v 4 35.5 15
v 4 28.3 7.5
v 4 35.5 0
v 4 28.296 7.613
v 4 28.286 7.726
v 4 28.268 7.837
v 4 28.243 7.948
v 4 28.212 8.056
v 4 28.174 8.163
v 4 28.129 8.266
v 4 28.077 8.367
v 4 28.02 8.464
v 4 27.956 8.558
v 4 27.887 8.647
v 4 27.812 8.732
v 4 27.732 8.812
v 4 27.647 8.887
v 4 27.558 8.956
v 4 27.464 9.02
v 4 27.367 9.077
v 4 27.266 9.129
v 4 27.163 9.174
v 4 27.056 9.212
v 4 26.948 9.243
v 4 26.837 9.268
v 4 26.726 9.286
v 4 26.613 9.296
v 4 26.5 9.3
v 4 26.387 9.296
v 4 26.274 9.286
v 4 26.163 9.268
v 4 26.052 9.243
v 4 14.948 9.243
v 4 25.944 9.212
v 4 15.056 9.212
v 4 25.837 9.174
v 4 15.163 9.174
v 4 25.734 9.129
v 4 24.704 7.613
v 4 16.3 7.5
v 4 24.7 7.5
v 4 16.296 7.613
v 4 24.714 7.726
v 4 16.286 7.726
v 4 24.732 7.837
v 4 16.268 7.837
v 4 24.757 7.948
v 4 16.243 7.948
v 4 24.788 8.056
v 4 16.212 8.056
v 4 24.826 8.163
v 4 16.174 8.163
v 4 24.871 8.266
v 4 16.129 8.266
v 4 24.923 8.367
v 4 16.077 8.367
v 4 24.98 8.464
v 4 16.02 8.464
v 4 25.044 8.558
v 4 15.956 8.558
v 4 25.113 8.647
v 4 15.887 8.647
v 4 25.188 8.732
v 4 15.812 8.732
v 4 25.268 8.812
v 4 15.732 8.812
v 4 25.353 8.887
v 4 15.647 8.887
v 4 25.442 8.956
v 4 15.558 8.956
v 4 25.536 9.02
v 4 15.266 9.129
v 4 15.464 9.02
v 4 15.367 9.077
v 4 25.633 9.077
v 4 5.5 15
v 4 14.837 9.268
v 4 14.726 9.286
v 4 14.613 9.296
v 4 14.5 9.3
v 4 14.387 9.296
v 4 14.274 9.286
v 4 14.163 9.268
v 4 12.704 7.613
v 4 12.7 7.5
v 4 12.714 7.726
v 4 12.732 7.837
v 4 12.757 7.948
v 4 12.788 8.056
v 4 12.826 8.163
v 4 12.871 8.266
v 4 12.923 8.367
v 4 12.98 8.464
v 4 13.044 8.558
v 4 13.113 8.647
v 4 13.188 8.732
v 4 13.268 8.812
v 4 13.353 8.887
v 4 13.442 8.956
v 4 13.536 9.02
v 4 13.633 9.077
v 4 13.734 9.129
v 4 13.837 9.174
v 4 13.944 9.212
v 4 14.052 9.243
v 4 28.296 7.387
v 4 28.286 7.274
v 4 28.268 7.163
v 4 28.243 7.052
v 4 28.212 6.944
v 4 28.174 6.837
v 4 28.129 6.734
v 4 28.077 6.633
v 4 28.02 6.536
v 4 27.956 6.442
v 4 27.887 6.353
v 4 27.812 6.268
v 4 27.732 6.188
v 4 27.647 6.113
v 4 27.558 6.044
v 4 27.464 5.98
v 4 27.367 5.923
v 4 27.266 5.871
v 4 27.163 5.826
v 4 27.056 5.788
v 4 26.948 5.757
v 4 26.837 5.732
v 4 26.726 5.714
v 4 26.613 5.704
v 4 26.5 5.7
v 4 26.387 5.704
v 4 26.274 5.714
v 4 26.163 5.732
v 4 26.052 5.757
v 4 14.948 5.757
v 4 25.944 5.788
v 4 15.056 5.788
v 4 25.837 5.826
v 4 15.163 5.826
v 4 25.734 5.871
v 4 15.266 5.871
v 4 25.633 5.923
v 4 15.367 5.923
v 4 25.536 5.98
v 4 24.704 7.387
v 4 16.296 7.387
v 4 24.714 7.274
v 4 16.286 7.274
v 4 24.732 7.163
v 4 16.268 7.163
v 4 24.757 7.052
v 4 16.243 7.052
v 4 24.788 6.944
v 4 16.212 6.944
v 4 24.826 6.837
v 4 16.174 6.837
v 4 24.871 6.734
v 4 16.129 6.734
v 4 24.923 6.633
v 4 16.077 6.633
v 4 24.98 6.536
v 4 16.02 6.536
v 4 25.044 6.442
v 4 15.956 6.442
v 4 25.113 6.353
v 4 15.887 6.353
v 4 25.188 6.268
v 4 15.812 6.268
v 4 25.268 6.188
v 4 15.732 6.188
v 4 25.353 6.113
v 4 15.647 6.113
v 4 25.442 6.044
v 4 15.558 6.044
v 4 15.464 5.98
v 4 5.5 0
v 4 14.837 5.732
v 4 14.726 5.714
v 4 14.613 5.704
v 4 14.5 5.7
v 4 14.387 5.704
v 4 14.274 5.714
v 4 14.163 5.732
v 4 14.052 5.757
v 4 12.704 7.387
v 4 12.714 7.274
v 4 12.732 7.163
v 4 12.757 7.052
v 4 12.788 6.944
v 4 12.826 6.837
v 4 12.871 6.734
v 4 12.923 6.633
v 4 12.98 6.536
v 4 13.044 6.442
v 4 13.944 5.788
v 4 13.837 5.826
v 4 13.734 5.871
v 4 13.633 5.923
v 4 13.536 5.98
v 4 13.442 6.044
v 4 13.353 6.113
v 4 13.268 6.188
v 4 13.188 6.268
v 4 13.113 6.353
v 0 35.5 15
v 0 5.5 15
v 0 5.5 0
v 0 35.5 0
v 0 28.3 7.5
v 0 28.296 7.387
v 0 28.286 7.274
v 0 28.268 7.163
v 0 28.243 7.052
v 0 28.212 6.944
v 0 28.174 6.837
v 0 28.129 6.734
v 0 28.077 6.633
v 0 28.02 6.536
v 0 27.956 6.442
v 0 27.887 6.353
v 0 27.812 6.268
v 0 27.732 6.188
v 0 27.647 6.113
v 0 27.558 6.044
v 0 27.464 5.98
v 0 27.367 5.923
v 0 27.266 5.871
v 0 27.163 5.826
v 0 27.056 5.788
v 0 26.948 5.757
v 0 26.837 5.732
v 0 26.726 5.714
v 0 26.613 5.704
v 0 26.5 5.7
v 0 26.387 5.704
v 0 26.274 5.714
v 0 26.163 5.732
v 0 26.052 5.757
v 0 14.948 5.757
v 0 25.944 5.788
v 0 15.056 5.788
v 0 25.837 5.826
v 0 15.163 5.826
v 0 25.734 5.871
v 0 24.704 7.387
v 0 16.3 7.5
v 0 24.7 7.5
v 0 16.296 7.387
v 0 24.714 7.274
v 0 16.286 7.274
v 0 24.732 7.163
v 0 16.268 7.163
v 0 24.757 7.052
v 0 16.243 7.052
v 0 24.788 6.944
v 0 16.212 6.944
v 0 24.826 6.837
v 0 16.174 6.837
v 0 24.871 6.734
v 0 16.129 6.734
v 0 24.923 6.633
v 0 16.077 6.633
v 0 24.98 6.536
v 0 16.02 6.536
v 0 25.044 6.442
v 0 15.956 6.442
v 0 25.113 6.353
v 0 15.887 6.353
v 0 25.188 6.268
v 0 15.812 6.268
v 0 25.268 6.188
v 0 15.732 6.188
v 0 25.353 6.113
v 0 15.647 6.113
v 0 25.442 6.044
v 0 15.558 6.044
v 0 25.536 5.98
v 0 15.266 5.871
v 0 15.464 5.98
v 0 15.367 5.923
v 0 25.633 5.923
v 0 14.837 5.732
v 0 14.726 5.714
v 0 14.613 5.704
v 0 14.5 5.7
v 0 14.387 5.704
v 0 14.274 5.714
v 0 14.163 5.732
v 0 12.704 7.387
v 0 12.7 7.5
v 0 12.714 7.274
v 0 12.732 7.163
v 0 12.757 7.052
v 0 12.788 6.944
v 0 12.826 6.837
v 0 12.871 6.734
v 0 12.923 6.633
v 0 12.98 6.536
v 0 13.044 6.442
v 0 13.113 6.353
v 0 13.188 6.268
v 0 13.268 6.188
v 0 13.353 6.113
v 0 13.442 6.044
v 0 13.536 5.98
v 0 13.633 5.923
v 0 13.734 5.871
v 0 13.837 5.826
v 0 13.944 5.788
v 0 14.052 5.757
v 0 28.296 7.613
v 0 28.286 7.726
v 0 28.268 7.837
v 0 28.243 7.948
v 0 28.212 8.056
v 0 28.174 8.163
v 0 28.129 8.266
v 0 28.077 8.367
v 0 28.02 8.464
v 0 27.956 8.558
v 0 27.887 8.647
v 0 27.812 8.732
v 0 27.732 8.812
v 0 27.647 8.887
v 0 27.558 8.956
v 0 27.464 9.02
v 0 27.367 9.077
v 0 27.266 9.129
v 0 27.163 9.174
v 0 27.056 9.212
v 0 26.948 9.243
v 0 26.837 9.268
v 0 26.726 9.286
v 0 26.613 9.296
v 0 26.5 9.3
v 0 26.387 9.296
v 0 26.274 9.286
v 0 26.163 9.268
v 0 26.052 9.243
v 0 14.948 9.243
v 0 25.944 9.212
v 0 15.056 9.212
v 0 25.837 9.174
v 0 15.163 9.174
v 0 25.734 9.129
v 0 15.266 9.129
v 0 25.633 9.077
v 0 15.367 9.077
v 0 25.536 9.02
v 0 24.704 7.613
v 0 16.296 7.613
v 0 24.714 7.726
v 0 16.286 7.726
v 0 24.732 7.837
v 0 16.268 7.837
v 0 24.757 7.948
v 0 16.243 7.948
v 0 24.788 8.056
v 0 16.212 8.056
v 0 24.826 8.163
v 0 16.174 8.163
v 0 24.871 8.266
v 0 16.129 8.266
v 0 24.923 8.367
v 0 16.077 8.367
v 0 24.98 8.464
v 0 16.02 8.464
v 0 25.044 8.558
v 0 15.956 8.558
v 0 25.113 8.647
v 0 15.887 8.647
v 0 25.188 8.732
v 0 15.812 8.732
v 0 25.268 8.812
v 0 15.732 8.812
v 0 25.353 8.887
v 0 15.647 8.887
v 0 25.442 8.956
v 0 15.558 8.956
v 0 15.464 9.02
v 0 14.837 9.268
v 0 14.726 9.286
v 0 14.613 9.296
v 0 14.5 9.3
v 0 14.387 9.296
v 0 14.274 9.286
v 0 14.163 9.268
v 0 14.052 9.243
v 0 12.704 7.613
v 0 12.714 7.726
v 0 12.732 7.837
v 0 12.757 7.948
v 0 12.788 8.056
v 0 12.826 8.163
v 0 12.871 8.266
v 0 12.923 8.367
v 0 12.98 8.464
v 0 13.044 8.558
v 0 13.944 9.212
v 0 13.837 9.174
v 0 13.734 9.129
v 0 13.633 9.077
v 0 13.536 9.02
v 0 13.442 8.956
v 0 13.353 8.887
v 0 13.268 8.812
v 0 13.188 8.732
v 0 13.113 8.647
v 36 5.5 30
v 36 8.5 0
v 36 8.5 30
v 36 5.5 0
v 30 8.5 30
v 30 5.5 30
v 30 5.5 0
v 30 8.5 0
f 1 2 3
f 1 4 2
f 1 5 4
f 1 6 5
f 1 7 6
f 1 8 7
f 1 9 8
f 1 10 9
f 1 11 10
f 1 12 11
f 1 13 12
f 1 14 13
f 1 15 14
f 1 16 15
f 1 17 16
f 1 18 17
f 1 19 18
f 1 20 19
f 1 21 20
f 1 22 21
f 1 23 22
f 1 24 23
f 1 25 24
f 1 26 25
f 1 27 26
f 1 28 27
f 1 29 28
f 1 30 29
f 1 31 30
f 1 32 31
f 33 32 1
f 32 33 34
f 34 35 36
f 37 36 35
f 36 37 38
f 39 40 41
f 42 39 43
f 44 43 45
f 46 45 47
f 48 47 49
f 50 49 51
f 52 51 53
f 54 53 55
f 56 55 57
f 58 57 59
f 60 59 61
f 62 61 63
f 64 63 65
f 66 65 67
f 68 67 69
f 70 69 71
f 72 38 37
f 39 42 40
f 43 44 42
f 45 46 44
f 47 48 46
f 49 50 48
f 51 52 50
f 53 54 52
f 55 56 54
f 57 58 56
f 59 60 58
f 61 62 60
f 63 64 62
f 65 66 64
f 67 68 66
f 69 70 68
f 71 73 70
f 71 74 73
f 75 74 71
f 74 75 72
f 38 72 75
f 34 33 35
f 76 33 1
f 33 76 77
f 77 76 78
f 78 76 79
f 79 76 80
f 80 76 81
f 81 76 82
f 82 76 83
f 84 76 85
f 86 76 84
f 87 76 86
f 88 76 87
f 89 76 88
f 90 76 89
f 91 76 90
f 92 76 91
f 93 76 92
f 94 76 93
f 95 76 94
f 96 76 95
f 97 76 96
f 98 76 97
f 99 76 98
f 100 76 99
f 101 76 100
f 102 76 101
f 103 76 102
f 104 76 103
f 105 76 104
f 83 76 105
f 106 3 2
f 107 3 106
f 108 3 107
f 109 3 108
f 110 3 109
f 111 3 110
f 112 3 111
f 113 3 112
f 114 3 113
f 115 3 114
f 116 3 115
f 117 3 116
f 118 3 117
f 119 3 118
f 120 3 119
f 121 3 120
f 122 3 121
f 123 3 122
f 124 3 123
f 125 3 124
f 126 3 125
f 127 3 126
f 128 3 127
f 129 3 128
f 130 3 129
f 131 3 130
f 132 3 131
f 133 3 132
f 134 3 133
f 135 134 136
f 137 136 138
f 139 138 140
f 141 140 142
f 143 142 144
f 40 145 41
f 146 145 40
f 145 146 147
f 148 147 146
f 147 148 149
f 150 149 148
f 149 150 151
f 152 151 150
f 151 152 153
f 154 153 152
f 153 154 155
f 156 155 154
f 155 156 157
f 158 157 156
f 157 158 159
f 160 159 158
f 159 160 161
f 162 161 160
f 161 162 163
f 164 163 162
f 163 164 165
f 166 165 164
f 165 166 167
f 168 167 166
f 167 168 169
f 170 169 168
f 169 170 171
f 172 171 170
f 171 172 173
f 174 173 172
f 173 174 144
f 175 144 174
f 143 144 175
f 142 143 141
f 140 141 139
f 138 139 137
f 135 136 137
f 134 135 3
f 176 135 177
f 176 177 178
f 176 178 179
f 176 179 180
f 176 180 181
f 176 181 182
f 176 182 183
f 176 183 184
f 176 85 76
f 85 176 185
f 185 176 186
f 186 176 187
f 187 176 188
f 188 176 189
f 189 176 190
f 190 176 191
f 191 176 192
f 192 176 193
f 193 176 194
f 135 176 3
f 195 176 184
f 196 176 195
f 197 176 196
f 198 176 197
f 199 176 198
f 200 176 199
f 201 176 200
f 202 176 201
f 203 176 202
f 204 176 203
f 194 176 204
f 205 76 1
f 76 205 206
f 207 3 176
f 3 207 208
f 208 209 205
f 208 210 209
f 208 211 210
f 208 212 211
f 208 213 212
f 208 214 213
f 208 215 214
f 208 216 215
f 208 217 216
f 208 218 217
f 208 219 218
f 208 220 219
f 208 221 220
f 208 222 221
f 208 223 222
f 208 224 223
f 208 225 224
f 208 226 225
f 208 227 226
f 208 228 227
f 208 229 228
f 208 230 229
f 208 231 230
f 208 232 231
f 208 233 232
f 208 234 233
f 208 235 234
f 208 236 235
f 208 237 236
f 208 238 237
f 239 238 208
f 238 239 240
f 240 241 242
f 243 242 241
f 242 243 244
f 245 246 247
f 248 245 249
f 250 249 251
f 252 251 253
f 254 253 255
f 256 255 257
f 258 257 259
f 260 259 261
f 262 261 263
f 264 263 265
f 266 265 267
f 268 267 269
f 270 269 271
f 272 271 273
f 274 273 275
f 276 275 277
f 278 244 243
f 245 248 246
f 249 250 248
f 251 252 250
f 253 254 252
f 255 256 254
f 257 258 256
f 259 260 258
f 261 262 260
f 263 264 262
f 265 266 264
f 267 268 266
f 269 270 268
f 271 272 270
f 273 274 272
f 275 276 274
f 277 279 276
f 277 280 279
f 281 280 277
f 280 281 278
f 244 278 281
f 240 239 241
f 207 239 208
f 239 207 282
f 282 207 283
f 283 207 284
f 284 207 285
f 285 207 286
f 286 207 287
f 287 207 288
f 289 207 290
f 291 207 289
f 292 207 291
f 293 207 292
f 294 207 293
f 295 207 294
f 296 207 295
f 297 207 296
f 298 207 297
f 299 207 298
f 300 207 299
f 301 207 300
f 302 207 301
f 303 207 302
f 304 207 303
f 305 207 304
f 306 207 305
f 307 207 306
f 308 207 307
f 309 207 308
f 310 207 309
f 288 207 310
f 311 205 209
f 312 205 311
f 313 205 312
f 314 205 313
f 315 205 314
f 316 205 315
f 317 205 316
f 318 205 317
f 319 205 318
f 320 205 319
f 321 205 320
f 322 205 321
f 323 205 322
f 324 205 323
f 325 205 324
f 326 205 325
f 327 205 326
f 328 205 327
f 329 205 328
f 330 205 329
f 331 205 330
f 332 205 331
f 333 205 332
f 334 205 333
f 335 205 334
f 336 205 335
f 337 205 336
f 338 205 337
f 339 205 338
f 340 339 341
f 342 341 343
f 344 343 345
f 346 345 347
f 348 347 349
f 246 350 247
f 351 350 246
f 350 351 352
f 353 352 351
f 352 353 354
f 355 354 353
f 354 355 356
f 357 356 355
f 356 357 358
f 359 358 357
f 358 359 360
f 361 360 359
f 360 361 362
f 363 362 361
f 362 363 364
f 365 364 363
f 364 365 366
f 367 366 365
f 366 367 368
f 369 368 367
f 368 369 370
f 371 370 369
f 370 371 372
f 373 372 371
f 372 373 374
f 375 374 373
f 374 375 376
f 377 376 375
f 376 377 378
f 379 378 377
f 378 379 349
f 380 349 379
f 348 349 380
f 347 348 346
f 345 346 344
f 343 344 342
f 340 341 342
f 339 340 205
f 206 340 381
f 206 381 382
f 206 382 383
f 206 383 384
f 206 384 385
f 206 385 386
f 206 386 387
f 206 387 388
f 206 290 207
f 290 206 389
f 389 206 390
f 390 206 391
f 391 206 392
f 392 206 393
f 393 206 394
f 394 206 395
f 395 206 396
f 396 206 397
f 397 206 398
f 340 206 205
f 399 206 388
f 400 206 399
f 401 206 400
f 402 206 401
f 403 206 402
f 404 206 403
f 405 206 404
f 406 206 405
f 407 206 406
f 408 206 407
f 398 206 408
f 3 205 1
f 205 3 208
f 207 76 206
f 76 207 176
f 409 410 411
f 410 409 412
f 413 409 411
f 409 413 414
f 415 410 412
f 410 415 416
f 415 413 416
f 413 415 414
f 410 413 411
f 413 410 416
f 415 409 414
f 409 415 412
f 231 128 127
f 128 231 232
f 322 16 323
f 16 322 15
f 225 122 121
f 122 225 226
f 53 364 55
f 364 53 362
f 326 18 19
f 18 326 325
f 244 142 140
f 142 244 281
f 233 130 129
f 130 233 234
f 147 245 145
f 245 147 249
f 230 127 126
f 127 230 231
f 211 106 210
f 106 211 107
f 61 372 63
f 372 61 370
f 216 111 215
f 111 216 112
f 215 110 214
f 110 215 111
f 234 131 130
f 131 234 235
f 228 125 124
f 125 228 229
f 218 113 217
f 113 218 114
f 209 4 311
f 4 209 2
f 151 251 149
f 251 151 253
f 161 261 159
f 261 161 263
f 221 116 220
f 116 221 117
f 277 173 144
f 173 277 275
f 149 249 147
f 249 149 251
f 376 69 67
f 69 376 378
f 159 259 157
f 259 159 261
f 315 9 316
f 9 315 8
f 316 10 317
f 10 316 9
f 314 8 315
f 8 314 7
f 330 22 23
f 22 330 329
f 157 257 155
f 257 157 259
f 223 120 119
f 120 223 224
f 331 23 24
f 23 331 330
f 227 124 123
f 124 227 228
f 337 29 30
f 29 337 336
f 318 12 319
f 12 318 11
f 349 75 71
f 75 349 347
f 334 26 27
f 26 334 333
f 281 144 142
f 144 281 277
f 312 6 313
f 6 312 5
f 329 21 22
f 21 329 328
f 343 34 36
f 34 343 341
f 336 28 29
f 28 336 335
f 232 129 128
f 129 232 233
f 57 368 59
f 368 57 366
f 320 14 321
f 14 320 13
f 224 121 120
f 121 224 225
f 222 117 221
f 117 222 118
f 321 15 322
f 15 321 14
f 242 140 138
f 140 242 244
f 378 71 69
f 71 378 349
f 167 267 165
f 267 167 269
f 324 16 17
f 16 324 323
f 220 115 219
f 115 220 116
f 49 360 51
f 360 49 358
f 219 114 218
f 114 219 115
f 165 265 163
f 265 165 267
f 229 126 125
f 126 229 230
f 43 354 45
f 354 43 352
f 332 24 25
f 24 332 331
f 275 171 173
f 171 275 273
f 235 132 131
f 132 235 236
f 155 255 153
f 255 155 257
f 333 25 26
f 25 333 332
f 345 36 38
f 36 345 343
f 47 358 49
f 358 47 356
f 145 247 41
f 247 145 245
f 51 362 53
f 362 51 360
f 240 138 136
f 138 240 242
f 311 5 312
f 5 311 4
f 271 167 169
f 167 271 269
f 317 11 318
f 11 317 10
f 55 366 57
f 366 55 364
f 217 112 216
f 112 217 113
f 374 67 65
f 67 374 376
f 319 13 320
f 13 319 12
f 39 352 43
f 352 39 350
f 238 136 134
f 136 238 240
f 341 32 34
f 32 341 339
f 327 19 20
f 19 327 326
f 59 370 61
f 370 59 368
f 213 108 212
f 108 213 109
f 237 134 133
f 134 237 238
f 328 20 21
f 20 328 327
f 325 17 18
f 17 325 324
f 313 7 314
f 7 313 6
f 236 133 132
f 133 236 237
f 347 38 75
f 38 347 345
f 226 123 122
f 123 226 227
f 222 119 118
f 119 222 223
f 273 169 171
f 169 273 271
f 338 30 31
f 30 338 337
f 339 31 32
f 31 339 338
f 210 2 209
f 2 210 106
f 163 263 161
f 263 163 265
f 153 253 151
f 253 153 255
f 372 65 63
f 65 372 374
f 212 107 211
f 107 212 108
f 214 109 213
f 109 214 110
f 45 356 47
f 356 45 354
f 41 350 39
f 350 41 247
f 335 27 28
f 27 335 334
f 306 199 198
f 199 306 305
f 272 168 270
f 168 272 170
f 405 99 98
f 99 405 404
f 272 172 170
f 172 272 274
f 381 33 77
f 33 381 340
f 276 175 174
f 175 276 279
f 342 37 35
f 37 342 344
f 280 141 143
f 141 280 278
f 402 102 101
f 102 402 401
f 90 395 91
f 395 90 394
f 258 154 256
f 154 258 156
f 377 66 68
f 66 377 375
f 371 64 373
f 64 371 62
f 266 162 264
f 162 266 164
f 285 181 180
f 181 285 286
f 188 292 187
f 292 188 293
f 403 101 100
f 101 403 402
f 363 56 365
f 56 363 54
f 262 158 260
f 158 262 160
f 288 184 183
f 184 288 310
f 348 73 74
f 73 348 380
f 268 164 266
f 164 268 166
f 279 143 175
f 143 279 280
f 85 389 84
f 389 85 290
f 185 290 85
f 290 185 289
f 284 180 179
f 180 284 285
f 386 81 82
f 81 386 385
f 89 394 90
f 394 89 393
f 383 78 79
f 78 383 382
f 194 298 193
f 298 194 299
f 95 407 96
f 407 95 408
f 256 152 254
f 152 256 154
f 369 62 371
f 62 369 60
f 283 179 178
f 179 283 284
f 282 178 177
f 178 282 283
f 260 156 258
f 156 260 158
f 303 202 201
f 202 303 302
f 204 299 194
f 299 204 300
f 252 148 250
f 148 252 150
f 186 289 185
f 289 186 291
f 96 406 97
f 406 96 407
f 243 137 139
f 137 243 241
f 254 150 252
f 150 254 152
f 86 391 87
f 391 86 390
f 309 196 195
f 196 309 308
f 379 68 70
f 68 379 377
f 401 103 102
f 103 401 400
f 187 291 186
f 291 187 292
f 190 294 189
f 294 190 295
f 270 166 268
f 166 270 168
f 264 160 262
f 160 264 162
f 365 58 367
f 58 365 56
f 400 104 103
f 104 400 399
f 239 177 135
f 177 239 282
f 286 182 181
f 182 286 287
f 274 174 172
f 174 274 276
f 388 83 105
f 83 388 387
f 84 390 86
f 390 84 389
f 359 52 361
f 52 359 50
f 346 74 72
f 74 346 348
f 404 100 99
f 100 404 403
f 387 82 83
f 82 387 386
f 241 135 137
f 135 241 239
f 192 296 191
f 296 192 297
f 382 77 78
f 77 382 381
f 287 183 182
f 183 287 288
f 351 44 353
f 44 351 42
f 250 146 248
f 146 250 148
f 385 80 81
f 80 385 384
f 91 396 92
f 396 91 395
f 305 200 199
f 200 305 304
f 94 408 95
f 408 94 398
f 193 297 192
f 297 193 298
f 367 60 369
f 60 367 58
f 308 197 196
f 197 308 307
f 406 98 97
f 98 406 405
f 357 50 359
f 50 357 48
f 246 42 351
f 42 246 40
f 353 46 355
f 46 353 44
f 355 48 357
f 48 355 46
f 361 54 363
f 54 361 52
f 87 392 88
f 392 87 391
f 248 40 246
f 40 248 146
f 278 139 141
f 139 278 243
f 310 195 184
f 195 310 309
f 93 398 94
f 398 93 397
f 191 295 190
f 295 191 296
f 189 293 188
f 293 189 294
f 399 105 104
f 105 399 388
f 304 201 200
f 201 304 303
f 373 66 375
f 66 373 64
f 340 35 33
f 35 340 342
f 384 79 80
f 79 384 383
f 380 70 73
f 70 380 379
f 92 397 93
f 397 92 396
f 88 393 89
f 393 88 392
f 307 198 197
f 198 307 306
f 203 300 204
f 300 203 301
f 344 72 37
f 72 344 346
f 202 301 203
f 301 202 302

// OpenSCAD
difference(){
	union(){
        
       translate([0,5.5,0]){
           cube([4,30,15], center=false);
       }
       translate([30,5.5,0]){
           cube([6,3,30], center=false);
       }


	}
	union() {

       translate([-10,41/2+6,7.5]){
            rotate(a = [0,90,0]) {
              cylinder(h=600, r=1.8, $fn=100, center=false);
            }
       }	
       translate([-10,41/2-6,7.5]){
            rotate(a = [0,90,0]) {
              cylinder(h=600, r=1.8, $fn=100, center=false);
            }
       }	

        
	}
}
